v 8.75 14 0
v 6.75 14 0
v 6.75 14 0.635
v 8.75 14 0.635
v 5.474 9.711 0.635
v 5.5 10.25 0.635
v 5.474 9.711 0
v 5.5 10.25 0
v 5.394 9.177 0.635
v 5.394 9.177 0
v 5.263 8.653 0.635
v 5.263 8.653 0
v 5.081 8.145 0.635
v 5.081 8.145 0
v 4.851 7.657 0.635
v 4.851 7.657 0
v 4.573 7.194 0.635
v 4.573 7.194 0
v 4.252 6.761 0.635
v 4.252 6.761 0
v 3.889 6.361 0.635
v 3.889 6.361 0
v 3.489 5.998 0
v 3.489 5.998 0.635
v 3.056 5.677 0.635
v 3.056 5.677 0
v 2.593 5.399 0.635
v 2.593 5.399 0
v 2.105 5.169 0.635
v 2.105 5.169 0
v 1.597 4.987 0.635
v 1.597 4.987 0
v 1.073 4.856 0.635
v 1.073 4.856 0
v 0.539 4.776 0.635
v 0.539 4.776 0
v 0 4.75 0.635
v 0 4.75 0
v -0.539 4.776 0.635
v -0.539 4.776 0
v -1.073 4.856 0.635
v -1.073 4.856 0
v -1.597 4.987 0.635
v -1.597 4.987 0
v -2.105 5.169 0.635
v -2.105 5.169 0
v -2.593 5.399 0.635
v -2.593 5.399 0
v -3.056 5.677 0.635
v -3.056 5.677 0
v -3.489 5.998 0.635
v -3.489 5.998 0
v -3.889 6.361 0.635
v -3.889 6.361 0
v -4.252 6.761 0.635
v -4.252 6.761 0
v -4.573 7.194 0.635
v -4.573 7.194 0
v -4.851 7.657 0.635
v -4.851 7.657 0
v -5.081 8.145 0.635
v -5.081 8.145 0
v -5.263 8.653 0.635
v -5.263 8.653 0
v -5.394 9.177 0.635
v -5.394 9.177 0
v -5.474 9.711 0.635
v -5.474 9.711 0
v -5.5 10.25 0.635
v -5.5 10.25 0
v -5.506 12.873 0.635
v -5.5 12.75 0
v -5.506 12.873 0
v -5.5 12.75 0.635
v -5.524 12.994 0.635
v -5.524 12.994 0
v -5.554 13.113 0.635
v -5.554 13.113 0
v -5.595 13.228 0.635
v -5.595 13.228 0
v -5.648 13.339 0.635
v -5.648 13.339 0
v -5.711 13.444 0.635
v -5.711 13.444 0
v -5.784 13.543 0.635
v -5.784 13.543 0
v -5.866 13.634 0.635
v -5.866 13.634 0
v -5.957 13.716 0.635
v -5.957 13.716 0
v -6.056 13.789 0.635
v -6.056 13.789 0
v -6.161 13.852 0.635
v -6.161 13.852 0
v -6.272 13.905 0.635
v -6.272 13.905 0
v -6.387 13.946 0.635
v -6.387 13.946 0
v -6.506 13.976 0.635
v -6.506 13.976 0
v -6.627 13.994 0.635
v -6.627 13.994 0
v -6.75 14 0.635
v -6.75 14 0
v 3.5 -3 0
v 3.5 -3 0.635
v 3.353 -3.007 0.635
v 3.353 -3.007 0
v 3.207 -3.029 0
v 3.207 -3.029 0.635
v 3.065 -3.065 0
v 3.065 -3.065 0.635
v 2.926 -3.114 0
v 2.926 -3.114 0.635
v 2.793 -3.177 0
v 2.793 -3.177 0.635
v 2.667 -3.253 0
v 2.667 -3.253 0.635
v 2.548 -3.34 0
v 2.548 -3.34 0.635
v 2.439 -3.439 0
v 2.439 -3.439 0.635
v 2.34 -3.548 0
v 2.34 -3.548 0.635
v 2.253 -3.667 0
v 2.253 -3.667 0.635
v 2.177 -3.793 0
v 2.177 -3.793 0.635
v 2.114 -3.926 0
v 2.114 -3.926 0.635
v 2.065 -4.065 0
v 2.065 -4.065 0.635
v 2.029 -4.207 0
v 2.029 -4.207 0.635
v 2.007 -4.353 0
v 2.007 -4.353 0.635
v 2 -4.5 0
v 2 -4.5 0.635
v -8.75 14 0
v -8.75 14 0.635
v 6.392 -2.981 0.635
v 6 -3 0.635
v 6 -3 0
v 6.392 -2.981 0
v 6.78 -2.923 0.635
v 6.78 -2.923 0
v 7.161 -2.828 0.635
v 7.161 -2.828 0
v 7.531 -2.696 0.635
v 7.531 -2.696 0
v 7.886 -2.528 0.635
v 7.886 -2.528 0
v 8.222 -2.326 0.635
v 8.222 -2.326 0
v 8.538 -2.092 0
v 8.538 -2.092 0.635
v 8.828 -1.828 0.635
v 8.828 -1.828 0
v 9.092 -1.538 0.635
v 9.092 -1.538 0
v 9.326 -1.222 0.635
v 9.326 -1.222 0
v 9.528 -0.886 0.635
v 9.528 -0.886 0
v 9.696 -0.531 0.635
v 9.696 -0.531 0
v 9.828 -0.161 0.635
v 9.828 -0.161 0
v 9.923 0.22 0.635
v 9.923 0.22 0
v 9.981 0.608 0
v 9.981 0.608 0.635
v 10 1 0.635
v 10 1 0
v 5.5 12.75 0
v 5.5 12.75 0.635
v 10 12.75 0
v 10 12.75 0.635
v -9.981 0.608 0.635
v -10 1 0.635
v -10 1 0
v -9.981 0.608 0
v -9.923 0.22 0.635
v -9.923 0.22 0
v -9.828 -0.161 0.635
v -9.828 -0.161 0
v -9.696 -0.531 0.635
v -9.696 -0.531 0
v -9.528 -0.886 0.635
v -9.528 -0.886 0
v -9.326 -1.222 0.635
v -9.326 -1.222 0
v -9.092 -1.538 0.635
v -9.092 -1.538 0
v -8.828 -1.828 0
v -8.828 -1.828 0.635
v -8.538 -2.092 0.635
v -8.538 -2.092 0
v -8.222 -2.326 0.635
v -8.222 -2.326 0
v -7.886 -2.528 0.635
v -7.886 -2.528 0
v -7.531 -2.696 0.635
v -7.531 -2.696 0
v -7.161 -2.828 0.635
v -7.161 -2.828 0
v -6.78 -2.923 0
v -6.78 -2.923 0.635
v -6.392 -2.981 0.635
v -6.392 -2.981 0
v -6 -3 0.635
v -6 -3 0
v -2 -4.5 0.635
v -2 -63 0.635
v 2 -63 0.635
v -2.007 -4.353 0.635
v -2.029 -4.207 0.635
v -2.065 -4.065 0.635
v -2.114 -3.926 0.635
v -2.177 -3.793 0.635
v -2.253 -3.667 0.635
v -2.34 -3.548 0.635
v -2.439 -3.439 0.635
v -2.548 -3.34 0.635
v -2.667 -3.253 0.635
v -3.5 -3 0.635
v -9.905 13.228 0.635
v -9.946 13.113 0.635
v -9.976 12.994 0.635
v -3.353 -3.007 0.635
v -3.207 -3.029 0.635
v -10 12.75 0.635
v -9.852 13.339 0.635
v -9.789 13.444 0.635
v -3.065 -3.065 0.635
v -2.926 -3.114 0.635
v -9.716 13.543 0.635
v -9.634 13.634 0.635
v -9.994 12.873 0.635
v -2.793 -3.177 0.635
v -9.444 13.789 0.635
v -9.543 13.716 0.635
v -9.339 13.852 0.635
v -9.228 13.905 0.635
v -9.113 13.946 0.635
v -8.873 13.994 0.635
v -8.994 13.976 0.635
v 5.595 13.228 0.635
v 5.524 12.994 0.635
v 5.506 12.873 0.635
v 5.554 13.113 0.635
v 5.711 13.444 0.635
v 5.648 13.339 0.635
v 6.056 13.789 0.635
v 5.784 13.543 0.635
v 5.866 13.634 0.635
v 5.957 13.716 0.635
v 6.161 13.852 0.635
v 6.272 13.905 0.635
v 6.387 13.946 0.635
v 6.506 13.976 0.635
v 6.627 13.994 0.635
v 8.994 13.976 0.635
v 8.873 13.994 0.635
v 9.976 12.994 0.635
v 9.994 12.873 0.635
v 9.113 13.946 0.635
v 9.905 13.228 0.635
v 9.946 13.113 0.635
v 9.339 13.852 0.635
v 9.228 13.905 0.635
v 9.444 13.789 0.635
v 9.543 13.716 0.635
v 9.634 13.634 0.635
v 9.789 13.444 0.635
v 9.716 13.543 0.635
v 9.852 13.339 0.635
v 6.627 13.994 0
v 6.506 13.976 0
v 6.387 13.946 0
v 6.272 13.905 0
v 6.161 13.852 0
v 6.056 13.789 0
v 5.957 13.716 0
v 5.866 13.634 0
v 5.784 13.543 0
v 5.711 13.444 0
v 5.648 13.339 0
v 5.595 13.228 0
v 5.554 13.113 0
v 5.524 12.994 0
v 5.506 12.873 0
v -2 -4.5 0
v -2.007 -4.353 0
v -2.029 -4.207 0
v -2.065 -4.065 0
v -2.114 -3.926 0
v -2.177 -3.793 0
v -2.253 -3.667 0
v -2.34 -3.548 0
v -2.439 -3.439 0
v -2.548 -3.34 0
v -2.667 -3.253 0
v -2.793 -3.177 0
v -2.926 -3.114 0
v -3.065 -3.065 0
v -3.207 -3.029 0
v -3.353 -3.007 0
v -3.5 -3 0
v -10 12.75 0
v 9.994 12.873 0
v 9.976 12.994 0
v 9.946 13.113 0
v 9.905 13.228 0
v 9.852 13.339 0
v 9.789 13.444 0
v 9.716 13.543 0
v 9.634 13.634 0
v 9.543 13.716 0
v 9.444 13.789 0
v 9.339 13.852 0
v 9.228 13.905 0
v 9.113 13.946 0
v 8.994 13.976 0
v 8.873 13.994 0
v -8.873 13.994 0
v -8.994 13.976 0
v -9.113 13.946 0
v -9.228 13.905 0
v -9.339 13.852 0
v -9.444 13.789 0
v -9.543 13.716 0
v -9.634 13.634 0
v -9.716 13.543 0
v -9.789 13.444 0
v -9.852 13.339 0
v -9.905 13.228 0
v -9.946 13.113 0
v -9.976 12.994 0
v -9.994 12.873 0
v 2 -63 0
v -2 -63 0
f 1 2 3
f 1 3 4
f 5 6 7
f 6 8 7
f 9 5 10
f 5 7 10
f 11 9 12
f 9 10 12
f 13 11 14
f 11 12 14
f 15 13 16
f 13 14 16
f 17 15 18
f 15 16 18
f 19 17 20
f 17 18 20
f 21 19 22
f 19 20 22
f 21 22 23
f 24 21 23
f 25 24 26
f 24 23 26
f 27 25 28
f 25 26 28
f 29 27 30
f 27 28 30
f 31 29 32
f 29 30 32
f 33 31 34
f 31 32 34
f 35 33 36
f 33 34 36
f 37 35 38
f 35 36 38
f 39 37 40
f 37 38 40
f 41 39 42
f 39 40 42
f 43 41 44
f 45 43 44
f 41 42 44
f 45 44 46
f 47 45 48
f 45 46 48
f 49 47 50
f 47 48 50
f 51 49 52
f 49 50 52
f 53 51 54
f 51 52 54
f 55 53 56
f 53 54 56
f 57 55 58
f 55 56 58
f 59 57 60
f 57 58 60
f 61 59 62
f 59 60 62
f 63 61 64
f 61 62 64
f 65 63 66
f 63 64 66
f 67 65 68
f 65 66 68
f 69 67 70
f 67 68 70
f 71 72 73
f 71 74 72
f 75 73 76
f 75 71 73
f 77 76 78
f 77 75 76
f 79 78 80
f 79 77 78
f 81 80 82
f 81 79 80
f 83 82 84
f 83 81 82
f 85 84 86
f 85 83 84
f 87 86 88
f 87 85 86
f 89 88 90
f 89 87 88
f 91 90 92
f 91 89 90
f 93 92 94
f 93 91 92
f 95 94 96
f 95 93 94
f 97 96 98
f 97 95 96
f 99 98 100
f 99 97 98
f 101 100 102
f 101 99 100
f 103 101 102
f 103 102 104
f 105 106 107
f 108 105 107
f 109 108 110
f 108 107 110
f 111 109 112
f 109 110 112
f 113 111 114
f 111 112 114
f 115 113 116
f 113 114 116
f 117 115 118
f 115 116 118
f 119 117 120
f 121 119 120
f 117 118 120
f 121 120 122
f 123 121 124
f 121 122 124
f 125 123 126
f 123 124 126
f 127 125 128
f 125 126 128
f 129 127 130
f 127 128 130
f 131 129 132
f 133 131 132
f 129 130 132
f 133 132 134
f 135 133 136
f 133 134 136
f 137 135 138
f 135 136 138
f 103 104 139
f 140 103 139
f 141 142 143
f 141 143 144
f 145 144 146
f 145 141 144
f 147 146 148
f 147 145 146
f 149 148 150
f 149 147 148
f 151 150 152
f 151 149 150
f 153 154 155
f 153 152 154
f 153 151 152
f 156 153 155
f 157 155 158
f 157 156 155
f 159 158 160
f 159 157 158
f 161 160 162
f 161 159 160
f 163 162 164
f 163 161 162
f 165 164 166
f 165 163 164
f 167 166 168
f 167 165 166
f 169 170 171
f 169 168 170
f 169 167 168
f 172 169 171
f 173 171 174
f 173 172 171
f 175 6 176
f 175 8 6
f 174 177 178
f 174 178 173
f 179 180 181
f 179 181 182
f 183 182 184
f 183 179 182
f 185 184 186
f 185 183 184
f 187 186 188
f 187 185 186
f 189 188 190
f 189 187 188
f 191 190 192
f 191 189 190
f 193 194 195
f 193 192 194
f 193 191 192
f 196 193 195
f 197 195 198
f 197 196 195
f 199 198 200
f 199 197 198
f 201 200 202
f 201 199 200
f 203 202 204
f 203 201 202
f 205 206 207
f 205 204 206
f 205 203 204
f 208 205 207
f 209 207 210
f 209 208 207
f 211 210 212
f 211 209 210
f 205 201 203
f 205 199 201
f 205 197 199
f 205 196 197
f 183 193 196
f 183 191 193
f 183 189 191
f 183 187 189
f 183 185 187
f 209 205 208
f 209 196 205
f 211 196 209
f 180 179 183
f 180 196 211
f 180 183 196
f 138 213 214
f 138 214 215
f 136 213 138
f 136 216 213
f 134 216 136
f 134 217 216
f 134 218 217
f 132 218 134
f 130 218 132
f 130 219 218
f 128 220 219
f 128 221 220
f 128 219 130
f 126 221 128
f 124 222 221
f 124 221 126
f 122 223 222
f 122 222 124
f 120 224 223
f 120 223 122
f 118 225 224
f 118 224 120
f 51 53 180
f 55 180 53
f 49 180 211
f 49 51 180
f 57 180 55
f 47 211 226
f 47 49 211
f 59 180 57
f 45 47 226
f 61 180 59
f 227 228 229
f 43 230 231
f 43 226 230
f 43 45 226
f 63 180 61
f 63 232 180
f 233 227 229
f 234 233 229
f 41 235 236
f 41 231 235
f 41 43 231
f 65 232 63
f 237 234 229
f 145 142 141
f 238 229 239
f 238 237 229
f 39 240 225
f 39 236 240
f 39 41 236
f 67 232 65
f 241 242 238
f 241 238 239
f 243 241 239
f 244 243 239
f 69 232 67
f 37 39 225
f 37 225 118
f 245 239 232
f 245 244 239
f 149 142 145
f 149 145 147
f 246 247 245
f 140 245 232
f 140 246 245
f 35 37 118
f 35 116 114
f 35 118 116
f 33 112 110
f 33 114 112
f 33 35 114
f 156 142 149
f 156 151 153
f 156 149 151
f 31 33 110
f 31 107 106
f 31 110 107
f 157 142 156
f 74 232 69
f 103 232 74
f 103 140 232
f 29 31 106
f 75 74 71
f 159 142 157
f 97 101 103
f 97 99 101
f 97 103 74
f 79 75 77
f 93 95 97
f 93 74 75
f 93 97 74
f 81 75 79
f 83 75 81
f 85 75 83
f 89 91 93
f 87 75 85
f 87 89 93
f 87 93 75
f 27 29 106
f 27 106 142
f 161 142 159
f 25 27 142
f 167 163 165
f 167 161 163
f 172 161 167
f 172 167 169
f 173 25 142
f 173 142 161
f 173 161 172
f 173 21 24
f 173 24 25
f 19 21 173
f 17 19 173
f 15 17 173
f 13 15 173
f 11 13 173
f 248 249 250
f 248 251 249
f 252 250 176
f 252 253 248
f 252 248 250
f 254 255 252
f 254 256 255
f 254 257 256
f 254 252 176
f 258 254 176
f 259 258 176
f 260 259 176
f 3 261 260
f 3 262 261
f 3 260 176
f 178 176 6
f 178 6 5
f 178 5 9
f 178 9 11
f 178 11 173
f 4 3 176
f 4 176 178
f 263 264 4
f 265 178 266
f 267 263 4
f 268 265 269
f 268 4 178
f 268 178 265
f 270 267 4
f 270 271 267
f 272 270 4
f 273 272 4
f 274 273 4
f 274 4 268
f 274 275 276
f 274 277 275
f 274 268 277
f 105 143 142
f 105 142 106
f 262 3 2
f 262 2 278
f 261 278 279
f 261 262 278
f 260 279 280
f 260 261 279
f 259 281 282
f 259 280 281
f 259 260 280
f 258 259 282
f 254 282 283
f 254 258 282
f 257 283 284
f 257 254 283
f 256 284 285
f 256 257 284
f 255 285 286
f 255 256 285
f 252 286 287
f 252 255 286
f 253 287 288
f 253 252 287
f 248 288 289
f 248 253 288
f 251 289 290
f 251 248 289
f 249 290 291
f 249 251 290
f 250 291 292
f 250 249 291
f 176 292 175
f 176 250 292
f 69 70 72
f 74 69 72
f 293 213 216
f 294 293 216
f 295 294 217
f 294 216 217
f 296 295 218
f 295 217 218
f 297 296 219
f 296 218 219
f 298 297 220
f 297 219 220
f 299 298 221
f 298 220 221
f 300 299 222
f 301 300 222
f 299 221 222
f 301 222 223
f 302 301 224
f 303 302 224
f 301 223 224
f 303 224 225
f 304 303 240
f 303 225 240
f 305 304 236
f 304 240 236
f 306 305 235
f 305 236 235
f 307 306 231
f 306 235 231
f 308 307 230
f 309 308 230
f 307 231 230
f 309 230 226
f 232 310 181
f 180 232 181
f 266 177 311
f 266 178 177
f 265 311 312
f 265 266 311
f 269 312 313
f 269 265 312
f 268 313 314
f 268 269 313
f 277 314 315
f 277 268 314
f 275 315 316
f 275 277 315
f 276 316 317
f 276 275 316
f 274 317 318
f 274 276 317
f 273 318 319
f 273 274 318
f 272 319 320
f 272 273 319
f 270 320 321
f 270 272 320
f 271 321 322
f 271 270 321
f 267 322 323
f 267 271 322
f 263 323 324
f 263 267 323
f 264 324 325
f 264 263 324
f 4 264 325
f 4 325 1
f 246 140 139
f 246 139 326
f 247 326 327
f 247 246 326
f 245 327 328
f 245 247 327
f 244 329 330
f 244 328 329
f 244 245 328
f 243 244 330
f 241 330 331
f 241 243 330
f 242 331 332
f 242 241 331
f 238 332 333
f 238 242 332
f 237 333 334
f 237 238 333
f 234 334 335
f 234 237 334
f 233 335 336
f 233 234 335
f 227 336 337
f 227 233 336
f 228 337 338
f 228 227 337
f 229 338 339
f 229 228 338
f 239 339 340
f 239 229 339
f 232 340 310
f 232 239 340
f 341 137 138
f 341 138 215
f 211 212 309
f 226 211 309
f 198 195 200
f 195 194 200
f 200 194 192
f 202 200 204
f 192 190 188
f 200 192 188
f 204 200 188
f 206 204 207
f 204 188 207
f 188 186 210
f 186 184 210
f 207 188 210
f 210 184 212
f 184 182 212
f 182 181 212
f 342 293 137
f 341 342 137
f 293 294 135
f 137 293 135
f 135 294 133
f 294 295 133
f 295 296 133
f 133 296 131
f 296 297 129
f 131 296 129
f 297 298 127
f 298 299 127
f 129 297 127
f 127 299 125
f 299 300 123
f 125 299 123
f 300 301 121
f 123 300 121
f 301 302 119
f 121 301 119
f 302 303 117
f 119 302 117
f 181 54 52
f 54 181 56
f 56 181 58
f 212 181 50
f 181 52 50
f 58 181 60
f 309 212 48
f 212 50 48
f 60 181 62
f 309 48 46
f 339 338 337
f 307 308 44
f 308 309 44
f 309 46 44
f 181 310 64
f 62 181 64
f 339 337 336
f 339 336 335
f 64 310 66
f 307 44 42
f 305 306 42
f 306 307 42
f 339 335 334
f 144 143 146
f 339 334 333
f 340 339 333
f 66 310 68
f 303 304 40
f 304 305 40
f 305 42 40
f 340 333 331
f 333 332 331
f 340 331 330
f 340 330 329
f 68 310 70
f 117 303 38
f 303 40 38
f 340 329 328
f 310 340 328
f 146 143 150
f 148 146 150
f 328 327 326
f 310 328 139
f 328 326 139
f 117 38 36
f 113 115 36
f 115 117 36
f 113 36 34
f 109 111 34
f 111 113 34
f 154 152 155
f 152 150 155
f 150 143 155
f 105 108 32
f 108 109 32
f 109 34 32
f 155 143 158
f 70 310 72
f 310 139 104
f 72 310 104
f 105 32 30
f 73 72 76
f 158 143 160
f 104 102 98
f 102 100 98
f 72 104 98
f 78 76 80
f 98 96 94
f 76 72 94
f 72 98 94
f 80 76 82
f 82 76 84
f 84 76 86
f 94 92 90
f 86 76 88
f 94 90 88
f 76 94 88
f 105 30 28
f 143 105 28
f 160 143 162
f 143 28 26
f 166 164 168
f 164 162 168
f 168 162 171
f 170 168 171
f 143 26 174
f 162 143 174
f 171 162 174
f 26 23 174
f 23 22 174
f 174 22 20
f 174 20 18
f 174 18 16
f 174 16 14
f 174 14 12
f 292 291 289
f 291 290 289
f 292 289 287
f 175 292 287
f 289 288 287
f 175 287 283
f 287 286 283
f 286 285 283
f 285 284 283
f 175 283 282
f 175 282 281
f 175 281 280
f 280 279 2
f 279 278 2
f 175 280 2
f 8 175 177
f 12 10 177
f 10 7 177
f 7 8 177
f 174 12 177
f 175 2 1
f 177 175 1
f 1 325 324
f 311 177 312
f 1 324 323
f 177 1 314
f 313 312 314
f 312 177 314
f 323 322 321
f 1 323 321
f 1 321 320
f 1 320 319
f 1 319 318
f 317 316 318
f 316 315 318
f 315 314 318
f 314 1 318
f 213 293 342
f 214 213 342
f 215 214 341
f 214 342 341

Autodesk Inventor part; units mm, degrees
ref_plane "YZ Plane" through (0, 0, 0) normal (1, 0, 0) x (0, 1, 0)
ref_plane "XZ Plane" through (0, 0, 0) normal (0, 1, 0) x (-1, 0, 0)
ref_plane "XY Plane" through (0, 0, 0) normal (0, 0, 1) x (1, 0, 0)
sketch "Sketch1" plane through (0, 0, 0) normal (0, 0, 1) x (1, 0, 0)
  line L0 (0, -78.4) -> (0, 29.4) projected
  line L1 (5.5, 10.25) -> (5.5, 14)
  line L2 (5.5, 14) -> (10, 14)
  line L3 (10, 14) -> (10, -3)
  line L4 (10, -3) -> (2, -3)
  line L5 (2, -3) -> (2, -63)
  line L6 (2, -63) -> (0, -63)
  line L7 (-5.5, 10.25) -> (-5.5, 14)
  line L8 (-5.5, 14) -> (-10, 14)
  line L9 (-10, 14) -> (-10, -3)
  line L10 (-10, -3) -> (-2, -3)
  line L11 (-2, -3) -> (-2, -63)
  line L12 (-2, -63) -> (0, -63)
  arc A0 (-5.5, 10.25) -> (5.5, 10.25) centre (0, 10.25) ccw
  point P0 (0, 0)
  point P1 (5.5, 3.5)
  point P2 (-5.5, 3.5)
  point P3 (5.5, -3)
  point P4 (0, 14)
  dimension "d0" = 4.5
  dimension "d1" = 20
  dimension "d2" = 4
  dimension "d7" = 60
  dimension "d13" = 11
  dimension "d14" = 17
  dimension "d16" = 3.75
extrude "Extrusion1" add sketch "Sketch1" along normal blind 0.635
fillet "Fillet1" radius 1.25 4 edges at (-10, 14, 0.3175) (10, 14, 0.3175) (-5.5, 14, 0.3175) (5.5, 14, 0.3175)
fillet "Fillet3" radius 4 2 edges at (-10, -3, 0.3175) (10, -3, 0.3175)
fillet "Fillet4" radius 1.5 2 edges at (-2, -3, 0.3175) (2, -3, 0.3175)
properties part number "ASAP_Handle_Fixture_New2_1"
